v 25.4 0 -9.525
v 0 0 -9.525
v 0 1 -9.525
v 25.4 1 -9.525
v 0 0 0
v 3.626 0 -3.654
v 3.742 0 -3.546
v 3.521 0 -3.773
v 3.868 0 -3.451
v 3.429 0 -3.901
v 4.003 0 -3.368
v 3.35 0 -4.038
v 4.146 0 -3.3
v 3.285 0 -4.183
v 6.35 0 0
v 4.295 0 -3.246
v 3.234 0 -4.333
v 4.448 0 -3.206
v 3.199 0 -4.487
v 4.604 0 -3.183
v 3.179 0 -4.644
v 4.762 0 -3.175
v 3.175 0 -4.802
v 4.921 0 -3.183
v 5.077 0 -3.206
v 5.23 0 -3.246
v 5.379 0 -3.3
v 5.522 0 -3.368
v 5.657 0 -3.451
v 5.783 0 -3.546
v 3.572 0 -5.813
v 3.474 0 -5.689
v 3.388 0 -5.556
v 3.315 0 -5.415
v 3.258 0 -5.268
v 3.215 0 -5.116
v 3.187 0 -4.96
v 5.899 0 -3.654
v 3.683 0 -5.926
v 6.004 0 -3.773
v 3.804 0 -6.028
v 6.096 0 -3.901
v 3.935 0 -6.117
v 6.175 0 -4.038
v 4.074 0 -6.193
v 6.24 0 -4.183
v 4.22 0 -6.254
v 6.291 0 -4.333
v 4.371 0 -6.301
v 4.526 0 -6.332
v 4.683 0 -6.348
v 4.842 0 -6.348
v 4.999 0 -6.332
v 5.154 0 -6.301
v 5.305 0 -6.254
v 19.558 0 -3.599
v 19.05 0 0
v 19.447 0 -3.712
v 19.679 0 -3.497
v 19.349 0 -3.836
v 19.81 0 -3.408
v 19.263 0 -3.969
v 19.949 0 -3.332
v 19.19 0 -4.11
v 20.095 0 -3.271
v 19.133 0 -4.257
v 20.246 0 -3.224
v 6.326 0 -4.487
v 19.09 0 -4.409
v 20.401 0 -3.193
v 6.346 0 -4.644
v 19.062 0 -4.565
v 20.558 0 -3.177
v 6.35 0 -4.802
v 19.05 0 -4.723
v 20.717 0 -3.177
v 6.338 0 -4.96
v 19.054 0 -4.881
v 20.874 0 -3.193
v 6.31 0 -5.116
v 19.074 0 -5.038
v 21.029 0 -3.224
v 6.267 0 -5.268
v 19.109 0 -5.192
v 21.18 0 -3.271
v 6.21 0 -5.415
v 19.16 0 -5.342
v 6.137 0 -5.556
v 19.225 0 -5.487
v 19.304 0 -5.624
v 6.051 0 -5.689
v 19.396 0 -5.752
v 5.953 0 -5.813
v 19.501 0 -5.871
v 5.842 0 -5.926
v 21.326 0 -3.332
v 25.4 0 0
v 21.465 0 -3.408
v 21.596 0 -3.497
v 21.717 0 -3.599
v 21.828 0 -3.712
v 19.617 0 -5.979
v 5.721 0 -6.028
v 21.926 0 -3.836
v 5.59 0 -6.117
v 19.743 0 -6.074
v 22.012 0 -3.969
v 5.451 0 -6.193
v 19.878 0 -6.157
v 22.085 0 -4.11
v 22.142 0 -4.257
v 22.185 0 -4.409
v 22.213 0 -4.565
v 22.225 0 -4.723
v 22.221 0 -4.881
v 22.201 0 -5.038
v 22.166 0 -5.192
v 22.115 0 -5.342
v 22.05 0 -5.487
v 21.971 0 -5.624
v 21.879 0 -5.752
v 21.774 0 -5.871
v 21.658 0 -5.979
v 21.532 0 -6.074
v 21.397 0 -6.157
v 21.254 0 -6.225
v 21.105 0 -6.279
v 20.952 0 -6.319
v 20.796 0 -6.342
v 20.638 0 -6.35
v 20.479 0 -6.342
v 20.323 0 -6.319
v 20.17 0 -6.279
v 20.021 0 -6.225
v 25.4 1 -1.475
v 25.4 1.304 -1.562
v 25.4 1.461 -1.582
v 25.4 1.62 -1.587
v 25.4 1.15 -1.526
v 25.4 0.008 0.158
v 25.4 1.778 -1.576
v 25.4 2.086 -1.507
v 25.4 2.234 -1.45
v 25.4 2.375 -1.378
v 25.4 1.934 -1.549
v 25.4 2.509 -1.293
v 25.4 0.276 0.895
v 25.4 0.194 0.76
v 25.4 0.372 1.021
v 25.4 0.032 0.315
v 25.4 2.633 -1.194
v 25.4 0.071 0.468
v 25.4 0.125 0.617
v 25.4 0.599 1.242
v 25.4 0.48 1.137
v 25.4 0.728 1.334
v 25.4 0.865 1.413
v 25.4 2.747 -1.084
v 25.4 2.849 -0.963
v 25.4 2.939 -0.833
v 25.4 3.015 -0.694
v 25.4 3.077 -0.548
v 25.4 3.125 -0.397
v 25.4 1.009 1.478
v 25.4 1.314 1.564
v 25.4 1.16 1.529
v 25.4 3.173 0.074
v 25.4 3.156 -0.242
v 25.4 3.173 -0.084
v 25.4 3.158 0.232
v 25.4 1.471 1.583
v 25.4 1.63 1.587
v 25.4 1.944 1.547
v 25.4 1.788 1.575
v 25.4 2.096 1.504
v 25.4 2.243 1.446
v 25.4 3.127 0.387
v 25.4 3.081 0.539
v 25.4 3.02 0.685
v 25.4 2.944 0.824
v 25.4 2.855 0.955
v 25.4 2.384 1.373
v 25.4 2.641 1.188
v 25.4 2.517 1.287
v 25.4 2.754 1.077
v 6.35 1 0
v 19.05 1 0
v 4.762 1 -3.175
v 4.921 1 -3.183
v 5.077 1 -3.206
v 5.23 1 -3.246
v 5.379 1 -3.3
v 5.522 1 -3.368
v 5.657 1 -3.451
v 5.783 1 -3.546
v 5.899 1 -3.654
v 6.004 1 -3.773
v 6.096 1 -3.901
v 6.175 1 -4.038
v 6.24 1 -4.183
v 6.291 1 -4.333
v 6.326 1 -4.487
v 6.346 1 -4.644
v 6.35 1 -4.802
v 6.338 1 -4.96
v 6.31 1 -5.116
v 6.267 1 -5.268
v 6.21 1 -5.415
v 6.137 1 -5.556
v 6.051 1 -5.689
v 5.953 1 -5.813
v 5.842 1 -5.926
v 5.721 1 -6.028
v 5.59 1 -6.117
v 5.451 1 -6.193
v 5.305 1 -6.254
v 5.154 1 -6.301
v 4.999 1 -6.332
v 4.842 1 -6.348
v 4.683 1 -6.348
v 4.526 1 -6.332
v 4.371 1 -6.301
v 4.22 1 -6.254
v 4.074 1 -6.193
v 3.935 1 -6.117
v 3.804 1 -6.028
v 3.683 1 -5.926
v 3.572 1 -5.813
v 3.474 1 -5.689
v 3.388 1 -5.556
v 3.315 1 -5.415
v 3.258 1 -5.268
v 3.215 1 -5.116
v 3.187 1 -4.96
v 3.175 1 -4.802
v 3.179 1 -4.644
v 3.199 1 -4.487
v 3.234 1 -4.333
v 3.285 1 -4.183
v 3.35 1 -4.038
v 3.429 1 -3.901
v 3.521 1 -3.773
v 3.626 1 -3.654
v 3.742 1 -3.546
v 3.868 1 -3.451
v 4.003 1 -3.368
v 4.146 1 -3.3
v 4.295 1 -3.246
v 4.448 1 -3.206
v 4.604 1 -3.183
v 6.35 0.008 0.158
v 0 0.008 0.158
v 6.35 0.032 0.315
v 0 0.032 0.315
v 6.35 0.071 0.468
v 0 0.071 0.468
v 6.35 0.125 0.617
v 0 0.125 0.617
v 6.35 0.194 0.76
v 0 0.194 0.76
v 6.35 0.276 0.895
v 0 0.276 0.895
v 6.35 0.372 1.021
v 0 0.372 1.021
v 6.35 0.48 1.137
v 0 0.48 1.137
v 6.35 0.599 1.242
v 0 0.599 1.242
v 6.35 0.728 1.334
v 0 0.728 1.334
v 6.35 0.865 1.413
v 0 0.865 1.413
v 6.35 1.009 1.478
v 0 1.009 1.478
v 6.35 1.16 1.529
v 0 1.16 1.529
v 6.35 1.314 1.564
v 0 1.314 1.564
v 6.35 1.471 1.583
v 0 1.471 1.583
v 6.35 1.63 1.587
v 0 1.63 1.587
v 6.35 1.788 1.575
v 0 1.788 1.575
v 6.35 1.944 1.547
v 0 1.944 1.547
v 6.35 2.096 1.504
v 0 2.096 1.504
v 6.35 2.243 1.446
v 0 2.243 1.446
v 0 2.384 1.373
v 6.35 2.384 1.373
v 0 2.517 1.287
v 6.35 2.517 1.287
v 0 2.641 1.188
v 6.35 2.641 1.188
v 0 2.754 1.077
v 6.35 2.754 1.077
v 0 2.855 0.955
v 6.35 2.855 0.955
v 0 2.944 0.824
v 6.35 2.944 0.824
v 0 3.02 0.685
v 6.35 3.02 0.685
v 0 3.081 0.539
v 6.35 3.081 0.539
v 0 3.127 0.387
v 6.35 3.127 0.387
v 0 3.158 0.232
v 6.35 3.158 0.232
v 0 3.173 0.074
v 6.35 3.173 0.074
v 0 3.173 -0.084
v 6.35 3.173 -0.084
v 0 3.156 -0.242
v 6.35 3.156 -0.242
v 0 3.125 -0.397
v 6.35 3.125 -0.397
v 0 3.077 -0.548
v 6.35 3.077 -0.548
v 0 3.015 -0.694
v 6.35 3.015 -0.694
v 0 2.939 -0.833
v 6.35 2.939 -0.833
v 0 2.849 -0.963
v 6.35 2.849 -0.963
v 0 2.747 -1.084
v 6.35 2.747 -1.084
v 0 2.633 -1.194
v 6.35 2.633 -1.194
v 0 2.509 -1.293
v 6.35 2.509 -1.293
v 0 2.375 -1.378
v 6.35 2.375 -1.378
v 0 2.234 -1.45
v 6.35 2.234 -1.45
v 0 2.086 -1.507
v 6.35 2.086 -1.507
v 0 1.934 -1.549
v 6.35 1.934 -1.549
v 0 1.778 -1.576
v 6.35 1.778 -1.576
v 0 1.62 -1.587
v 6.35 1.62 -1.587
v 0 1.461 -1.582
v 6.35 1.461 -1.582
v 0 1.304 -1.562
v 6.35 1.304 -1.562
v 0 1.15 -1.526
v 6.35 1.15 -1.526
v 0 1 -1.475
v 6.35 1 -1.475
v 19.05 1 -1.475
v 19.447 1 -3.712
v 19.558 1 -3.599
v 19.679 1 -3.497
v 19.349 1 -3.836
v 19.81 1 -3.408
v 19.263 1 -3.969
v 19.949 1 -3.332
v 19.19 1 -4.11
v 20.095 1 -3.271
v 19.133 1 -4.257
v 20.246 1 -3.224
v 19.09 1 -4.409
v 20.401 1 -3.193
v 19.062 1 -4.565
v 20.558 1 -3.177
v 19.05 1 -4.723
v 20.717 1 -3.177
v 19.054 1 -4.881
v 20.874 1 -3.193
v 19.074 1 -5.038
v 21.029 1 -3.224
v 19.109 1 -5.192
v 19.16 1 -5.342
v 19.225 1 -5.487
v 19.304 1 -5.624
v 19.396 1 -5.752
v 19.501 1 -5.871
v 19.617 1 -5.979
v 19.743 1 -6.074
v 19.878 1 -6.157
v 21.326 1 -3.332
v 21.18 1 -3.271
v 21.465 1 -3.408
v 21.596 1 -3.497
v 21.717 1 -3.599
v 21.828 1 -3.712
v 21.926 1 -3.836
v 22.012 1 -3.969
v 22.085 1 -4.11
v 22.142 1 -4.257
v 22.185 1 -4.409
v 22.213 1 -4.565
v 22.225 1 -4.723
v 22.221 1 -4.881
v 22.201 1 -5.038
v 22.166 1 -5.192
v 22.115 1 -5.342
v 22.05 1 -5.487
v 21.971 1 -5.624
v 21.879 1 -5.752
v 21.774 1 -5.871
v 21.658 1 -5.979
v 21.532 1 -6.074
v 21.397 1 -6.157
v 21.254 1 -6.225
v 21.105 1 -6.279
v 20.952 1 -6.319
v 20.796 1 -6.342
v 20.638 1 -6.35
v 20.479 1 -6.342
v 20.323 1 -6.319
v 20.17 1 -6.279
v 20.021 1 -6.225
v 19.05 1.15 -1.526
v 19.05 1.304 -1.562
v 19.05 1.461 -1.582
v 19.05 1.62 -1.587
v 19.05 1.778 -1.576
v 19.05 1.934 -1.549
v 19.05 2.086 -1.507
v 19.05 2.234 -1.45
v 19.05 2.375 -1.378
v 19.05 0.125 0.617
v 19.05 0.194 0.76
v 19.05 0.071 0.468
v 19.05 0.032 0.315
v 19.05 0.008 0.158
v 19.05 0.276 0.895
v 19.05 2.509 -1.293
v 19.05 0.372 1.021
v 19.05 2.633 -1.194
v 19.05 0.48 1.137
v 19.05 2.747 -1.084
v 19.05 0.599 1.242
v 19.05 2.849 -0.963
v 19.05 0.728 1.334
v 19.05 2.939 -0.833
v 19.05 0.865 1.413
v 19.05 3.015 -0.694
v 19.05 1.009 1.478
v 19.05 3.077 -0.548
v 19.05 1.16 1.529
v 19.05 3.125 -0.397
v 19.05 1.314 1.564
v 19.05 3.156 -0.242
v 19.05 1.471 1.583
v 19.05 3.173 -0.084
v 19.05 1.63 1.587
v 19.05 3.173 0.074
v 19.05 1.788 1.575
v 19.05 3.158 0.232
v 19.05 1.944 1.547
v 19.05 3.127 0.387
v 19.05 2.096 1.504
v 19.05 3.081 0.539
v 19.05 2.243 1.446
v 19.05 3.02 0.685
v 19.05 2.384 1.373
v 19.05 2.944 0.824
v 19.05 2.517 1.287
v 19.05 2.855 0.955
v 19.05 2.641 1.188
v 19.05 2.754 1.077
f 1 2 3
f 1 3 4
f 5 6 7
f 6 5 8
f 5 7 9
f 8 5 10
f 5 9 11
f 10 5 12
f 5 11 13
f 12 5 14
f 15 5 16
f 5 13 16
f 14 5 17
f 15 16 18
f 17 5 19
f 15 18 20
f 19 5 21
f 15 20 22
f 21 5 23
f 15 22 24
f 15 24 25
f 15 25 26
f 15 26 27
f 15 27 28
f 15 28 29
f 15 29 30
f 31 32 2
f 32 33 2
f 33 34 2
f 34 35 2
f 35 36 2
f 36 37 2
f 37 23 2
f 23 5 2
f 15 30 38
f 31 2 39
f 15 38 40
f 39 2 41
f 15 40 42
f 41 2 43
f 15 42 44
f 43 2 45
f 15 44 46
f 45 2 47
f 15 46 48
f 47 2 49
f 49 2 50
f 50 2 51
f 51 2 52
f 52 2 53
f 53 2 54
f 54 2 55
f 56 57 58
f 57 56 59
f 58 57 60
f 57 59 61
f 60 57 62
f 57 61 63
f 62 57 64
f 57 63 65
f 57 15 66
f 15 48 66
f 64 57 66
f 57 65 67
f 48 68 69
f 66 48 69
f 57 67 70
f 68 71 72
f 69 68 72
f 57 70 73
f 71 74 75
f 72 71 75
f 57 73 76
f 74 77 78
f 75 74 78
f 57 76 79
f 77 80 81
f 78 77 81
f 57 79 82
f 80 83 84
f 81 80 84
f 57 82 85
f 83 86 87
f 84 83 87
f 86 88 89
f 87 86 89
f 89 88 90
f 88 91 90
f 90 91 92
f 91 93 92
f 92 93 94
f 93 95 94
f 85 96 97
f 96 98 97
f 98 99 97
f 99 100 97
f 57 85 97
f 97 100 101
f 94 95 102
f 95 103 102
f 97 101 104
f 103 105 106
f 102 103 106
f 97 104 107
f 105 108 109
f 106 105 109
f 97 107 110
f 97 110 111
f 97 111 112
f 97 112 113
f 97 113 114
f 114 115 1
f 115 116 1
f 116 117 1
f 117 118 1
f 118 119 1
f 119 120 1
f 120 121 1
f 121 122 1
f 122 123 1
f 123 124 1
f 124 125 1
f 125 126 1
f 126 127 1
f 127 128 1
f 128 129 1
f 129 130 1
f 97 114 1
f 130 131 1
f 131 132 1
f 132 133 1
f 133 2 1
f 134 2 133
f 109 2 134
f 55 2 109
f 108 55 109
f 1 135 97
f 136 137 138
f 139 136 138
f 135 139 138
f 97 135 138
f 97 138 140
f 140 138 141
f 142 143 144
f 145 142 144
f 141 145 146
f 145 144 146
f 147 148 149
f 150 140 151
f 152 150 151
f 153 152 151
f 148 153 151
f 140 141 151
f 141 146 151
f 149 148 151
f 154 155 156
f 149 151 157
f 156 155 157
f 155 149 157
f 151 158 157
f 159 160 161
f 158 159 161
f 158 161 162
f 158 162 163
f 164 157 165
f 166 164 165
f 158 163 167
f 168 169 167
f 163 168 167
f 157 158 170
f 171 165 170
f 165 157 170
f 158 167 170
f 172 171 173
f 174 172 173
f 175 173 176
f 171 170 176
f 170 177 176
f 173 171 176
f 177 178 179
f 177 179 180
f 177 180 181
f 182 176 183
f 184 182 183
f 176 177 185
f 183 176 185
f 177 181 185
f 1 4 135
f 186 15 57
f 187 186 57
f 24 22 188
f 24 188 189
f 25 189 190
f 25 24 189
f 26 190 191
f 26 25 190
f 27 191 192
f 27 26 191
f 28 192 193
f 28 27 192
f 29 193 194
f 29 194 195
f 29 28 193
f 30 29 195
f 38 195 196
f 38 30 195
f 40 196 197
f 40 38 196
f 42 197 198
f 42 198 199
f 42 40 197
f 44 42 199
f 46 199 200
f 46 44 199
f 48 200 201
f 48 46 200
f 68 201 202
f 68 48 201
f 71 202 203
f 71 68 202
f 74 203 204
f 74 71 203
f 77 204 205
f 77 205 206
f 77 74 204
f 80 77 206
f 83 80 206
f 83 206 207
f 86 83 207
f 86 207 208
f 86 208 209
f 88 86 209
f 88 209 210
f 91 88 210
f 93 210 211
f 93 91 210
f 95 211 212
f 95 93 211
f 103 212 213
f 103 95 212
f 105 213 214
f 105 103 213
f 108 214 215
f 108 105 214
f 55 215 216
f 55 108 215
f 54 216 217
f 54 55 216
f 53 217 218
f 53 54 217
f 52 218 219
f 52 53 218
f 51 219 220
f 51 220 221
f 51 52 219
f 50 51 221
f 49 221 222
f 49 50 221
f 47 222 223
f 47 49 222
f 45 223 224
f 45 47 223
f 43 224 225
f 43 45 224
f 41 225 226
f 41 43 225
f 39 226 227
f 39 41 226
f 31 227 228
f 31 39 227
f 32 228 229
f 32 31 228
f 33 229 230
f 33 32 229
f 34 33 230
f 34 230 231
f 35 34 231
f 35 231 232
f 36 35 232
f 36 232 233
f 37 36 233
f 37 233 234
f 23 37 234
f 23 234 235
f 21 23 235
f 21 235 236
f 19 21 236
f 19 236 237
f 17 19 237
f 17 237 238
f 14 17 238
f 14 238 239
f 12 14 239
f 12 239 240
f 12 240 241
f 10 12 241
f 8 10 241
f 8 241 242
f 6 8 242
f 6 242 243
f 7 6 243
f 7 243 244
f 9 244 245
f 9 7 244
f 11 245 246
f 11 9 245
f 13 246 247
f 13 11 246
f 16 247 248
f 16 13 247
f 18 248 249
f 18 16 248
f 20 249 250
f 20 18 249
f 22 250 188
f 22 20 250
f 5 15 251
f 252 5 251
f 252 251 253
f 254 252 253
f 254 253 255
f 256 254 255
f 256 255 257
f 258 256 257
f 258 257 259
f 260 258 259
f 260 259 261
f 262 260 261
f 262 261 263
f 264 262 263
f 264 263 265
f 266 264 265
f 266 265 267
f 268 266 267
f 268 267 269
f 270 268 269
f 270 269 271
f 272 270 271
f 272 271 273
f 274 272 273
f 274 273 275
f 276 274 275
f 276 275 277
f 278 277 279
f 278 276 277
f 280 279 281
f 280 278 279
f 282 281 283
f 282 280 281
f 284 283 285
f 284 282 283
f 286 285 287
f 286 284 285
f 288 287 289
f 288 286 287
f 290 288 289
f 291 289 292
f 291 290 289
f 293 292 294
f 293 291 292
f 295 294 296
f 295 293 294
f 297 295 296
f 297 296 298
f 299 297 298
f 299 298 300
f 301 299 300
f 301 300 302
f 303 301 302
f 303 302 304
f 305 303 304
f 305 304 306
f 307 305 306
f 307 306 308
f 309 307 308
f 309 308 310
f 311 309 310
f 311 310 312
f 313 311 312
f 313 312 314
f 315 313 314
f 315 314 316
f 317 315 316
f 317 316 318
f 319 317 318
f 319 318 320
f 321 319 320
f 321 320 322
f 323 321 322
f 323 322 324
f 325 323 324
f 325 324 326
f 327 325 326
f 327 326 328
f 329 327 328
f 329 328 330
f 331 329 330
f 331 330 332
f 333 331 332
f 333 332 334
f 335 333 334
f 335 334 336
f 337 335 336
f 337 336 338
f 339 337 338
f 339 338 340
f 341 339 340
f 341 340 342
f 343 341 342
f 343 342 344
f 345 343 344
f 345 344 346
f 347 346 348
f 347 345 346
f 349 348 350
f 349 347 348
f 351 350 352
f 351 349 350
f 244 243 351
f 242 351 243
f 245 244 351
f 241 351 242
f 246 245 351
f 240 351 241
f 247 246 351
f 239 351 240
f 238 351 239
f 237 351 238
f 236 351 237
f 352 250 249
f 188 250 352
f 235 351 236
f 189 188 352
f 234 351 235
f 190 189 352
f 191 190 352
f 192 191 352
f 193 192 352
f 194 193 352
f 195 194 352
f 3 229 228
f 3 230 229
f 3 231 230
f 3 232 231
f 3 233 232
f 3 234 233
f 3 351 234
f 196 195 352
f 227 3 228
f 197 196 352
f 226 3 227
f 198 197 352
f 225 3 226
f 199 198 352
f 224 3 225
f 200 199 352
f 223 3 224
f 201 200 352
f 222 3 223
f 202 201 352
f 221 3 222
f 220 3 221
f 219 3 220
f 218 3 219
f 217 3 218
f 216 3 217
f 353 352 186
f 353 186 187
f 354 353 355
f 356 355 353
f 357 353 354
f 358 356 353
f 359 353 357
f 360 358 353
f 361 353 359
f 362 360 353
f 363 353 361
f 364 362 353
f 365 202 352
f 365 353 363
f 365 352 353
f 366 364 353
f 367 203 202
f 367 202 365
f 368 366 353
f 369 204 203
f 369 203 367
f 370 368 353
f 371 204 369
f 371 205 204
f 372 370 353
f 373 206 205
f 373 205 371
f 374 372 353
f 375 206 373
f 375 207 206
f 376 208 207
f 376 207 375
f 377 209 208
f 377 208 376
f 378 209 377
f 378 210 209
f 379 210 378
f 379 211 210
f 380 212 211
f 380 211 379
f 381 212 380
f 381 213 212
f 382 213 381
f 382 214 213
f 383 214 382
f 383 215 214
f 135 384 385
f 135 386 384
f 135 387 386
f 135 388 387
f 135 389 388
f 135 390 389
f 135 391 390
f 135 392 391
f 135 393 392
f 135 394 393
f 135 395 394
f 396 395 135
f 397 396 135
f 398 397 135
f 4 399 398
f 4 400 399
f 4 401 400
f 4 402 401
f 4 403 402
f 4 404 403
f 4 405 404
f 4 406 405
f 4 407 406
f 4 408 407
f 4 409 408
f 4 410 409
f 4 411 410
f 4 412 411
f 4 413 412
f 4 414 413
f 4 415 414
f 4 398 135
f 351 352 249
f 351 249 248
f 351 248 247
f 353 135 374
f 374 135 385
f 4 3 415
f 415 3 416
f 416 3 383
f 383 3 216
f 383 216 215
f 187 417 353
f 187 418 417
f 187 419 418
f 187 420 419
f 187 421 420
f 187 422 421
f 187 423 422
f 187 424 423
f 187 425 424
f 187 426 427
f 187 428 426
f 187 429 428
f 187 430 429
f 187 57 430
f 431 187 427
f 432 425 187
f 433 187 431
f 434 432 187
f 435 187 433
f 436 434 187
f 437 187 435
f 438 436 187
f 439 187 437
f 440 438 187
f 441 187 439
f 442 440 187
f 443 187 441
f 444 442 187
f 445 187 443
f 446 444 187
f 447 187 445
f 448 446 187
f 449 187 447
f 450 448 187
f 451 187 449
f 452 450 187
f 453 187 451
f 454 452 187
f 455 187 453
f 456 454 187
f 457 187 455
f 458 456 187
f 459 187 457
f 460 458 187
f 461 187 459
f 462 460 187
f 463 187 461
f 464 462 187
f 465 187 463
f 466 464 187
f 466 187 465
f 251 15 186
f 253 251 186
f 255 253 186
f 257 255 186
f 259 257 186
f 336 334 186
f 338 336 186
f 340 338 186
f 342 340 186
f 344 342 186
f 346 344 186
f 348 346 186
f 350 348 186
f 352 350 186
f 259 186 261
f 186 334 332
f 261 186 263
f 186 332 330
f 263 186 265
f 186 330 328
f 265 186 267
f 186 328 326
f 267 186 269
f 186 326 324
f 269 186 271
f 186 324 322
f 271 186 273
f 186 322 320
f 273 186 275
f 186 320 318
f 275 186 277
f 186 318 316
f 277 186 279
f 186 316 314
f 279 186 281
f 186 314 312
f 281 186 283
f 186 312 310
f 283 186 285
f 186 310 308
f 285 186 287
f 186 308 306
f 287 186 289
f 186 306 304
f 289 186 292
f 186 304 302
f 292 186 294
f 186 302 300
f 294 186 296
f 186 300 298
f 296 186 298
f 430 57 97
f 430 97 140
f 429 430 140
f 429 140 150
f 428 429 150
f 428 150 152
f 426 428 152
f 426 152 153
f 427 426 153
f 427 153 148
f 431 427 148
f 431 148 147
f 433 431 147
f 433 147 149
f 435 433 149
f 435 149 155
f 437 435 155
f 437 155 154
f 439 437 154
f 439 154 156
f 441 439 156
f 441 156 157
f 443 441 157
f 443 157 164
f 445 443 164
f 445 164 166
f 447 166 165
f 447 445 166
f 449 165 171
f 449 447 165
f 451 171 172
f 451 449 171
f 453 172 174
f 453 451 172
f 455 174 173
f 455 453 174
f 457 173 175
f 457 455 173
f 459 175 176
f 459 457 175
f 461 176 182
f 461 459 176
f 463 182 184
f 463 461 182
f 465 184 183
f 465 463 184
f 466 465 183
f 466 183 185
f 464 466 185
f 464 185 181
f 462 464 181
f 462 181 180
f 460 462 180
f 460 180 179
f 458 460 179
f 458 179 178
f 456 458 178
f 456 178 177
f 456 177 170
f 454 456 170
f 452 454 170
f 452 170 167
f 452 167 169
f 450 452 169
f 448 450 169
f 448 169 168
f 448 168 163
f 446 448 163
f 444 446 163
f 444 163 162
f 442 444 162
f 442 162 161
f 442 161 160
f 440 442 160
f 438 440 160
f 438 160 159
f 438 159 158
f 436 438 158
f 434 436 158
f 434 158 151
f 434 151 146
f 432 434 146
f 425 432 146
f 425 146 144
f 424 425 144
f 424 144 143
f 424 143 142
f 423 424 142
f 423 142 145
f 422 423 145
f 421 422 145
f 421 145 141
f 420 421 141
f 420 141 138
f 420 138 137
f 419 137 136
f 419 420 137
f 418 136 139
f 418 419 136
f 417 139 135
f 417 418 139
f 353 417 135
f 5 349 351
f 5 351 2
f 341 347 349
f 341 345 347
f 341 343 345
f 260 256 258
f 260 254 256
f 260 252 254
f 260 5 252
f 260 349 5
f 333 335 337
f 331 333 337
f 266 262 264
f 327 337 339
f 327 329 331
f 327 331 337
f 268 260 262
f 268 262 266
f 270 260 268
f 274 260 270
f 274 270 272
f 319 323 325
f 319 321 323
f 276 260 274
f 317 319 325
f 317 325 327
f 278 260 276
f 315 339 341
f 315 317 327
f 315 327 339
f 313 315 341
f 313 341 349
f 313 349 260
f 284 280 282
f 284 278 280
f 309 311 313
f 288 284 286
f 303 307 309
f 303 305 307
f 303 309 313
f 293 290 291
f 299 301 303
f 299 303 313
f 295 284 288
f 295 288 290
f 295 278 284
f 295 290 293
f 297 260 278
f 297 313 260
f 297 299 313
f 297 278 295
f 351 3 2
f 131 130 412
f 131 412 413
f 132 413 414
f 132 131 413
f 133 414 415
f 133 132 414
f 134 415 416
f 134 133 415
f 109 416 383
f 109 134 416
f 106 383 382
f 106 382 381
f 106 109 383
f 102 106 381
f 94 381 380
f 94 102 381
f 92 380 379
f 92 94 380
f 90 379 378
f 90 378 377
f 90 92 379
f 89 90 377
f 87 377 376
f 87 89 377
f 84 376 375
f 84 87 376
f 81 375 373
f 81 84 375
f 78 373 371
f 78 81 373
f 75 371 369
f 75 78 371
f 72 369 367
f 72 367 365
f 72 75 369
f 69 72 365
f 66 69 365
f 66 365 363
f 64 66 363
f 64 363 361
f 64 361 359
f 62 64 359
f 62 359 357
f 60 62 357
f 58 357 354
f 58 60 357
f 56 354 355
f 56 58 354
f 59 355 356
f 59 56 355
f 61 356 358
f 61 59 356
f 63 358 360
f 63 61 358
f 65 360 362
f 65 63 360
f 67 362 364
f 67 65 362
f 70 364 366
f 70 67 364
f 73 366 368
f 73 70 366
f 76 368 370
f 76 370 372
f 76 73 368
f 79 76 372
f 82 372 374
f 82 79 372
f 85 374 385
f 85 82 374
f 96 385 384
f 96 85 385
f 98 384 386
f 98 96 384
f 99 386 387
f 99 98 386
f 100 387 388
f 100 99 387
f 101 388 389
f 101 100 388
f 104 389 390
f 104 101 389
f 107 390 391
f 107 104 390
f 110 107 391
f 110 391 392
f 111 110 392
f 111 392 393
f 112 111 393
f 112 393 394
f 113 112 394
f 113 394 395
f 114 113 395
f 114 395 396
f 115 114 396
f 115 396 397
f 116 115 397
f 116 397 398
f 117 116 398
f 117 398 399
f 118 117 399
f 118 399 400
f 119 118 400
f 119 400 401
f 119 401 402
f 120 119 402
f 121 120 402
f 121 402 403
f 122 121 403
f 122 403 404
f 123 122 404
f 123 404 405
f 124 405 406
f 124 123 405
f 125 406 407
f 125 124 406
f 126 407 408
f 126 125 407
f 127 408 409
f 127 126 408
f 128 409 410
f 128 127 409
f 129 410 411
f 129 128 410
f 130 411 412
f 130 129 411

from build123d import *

# Parameters (mm, degrees)
SKETCH1_W           = 25.4
SKETCH1_H           = 9.525
SKETCH1_R           = 1.5875
BOSS_EXTRUDE1_DEPTH = 1
SKETCH2_R           = 1.5875
BOSS_EXTRUDE2_DEPTH = 6.35
LPATTERN1_COUNT     = 2
LPATTERN1_PITCH     = 19.05


with BuildPart() as part:
    # Sketch1 → Boss-Extrude1 (new body)
    with BuildSketch(Plane(origin=(0, 0, 0), x_dir=(1, 0, 0), z_dir=(0, 1, 0))):
        with Locations((12.7, 4.7625)):
            Rectangle(SKETCH1_W, SKETCH1_H)
        with Locations(Location((4.7625, 4.7625, 0), (0, 0, 270))):
            Circle(SKETCH1_R, mode=Mode.SUBTRACT)
        with Locations(Location((20.6375, 4.7625, 0), (0, 0, 90))):
            Circle(SKETCH1_R, mode=Mode.SUBTRACT)
    extrude(amount=BOSS_EXTRUDE1_DEPTH)

    # Sketch2 → Boss-Extrude2 (add)
    with BuildSketch(Plane.ZY):
        with Locations((0, 1.5875)):
            Circle(SKETCH2_R)
    boss_extrude2 = extrude(amount=-BOSS_EXTRUDE2_DEPTH)

    # LPattern1: Boss-Extrude2 ×2
    with Locations(*[(i * LPATTERN1_PITCH, 0, 0) for i in range(1, LPATTERN1_COUNT)]):
        add(boss_extrude2)


solid = part.part
